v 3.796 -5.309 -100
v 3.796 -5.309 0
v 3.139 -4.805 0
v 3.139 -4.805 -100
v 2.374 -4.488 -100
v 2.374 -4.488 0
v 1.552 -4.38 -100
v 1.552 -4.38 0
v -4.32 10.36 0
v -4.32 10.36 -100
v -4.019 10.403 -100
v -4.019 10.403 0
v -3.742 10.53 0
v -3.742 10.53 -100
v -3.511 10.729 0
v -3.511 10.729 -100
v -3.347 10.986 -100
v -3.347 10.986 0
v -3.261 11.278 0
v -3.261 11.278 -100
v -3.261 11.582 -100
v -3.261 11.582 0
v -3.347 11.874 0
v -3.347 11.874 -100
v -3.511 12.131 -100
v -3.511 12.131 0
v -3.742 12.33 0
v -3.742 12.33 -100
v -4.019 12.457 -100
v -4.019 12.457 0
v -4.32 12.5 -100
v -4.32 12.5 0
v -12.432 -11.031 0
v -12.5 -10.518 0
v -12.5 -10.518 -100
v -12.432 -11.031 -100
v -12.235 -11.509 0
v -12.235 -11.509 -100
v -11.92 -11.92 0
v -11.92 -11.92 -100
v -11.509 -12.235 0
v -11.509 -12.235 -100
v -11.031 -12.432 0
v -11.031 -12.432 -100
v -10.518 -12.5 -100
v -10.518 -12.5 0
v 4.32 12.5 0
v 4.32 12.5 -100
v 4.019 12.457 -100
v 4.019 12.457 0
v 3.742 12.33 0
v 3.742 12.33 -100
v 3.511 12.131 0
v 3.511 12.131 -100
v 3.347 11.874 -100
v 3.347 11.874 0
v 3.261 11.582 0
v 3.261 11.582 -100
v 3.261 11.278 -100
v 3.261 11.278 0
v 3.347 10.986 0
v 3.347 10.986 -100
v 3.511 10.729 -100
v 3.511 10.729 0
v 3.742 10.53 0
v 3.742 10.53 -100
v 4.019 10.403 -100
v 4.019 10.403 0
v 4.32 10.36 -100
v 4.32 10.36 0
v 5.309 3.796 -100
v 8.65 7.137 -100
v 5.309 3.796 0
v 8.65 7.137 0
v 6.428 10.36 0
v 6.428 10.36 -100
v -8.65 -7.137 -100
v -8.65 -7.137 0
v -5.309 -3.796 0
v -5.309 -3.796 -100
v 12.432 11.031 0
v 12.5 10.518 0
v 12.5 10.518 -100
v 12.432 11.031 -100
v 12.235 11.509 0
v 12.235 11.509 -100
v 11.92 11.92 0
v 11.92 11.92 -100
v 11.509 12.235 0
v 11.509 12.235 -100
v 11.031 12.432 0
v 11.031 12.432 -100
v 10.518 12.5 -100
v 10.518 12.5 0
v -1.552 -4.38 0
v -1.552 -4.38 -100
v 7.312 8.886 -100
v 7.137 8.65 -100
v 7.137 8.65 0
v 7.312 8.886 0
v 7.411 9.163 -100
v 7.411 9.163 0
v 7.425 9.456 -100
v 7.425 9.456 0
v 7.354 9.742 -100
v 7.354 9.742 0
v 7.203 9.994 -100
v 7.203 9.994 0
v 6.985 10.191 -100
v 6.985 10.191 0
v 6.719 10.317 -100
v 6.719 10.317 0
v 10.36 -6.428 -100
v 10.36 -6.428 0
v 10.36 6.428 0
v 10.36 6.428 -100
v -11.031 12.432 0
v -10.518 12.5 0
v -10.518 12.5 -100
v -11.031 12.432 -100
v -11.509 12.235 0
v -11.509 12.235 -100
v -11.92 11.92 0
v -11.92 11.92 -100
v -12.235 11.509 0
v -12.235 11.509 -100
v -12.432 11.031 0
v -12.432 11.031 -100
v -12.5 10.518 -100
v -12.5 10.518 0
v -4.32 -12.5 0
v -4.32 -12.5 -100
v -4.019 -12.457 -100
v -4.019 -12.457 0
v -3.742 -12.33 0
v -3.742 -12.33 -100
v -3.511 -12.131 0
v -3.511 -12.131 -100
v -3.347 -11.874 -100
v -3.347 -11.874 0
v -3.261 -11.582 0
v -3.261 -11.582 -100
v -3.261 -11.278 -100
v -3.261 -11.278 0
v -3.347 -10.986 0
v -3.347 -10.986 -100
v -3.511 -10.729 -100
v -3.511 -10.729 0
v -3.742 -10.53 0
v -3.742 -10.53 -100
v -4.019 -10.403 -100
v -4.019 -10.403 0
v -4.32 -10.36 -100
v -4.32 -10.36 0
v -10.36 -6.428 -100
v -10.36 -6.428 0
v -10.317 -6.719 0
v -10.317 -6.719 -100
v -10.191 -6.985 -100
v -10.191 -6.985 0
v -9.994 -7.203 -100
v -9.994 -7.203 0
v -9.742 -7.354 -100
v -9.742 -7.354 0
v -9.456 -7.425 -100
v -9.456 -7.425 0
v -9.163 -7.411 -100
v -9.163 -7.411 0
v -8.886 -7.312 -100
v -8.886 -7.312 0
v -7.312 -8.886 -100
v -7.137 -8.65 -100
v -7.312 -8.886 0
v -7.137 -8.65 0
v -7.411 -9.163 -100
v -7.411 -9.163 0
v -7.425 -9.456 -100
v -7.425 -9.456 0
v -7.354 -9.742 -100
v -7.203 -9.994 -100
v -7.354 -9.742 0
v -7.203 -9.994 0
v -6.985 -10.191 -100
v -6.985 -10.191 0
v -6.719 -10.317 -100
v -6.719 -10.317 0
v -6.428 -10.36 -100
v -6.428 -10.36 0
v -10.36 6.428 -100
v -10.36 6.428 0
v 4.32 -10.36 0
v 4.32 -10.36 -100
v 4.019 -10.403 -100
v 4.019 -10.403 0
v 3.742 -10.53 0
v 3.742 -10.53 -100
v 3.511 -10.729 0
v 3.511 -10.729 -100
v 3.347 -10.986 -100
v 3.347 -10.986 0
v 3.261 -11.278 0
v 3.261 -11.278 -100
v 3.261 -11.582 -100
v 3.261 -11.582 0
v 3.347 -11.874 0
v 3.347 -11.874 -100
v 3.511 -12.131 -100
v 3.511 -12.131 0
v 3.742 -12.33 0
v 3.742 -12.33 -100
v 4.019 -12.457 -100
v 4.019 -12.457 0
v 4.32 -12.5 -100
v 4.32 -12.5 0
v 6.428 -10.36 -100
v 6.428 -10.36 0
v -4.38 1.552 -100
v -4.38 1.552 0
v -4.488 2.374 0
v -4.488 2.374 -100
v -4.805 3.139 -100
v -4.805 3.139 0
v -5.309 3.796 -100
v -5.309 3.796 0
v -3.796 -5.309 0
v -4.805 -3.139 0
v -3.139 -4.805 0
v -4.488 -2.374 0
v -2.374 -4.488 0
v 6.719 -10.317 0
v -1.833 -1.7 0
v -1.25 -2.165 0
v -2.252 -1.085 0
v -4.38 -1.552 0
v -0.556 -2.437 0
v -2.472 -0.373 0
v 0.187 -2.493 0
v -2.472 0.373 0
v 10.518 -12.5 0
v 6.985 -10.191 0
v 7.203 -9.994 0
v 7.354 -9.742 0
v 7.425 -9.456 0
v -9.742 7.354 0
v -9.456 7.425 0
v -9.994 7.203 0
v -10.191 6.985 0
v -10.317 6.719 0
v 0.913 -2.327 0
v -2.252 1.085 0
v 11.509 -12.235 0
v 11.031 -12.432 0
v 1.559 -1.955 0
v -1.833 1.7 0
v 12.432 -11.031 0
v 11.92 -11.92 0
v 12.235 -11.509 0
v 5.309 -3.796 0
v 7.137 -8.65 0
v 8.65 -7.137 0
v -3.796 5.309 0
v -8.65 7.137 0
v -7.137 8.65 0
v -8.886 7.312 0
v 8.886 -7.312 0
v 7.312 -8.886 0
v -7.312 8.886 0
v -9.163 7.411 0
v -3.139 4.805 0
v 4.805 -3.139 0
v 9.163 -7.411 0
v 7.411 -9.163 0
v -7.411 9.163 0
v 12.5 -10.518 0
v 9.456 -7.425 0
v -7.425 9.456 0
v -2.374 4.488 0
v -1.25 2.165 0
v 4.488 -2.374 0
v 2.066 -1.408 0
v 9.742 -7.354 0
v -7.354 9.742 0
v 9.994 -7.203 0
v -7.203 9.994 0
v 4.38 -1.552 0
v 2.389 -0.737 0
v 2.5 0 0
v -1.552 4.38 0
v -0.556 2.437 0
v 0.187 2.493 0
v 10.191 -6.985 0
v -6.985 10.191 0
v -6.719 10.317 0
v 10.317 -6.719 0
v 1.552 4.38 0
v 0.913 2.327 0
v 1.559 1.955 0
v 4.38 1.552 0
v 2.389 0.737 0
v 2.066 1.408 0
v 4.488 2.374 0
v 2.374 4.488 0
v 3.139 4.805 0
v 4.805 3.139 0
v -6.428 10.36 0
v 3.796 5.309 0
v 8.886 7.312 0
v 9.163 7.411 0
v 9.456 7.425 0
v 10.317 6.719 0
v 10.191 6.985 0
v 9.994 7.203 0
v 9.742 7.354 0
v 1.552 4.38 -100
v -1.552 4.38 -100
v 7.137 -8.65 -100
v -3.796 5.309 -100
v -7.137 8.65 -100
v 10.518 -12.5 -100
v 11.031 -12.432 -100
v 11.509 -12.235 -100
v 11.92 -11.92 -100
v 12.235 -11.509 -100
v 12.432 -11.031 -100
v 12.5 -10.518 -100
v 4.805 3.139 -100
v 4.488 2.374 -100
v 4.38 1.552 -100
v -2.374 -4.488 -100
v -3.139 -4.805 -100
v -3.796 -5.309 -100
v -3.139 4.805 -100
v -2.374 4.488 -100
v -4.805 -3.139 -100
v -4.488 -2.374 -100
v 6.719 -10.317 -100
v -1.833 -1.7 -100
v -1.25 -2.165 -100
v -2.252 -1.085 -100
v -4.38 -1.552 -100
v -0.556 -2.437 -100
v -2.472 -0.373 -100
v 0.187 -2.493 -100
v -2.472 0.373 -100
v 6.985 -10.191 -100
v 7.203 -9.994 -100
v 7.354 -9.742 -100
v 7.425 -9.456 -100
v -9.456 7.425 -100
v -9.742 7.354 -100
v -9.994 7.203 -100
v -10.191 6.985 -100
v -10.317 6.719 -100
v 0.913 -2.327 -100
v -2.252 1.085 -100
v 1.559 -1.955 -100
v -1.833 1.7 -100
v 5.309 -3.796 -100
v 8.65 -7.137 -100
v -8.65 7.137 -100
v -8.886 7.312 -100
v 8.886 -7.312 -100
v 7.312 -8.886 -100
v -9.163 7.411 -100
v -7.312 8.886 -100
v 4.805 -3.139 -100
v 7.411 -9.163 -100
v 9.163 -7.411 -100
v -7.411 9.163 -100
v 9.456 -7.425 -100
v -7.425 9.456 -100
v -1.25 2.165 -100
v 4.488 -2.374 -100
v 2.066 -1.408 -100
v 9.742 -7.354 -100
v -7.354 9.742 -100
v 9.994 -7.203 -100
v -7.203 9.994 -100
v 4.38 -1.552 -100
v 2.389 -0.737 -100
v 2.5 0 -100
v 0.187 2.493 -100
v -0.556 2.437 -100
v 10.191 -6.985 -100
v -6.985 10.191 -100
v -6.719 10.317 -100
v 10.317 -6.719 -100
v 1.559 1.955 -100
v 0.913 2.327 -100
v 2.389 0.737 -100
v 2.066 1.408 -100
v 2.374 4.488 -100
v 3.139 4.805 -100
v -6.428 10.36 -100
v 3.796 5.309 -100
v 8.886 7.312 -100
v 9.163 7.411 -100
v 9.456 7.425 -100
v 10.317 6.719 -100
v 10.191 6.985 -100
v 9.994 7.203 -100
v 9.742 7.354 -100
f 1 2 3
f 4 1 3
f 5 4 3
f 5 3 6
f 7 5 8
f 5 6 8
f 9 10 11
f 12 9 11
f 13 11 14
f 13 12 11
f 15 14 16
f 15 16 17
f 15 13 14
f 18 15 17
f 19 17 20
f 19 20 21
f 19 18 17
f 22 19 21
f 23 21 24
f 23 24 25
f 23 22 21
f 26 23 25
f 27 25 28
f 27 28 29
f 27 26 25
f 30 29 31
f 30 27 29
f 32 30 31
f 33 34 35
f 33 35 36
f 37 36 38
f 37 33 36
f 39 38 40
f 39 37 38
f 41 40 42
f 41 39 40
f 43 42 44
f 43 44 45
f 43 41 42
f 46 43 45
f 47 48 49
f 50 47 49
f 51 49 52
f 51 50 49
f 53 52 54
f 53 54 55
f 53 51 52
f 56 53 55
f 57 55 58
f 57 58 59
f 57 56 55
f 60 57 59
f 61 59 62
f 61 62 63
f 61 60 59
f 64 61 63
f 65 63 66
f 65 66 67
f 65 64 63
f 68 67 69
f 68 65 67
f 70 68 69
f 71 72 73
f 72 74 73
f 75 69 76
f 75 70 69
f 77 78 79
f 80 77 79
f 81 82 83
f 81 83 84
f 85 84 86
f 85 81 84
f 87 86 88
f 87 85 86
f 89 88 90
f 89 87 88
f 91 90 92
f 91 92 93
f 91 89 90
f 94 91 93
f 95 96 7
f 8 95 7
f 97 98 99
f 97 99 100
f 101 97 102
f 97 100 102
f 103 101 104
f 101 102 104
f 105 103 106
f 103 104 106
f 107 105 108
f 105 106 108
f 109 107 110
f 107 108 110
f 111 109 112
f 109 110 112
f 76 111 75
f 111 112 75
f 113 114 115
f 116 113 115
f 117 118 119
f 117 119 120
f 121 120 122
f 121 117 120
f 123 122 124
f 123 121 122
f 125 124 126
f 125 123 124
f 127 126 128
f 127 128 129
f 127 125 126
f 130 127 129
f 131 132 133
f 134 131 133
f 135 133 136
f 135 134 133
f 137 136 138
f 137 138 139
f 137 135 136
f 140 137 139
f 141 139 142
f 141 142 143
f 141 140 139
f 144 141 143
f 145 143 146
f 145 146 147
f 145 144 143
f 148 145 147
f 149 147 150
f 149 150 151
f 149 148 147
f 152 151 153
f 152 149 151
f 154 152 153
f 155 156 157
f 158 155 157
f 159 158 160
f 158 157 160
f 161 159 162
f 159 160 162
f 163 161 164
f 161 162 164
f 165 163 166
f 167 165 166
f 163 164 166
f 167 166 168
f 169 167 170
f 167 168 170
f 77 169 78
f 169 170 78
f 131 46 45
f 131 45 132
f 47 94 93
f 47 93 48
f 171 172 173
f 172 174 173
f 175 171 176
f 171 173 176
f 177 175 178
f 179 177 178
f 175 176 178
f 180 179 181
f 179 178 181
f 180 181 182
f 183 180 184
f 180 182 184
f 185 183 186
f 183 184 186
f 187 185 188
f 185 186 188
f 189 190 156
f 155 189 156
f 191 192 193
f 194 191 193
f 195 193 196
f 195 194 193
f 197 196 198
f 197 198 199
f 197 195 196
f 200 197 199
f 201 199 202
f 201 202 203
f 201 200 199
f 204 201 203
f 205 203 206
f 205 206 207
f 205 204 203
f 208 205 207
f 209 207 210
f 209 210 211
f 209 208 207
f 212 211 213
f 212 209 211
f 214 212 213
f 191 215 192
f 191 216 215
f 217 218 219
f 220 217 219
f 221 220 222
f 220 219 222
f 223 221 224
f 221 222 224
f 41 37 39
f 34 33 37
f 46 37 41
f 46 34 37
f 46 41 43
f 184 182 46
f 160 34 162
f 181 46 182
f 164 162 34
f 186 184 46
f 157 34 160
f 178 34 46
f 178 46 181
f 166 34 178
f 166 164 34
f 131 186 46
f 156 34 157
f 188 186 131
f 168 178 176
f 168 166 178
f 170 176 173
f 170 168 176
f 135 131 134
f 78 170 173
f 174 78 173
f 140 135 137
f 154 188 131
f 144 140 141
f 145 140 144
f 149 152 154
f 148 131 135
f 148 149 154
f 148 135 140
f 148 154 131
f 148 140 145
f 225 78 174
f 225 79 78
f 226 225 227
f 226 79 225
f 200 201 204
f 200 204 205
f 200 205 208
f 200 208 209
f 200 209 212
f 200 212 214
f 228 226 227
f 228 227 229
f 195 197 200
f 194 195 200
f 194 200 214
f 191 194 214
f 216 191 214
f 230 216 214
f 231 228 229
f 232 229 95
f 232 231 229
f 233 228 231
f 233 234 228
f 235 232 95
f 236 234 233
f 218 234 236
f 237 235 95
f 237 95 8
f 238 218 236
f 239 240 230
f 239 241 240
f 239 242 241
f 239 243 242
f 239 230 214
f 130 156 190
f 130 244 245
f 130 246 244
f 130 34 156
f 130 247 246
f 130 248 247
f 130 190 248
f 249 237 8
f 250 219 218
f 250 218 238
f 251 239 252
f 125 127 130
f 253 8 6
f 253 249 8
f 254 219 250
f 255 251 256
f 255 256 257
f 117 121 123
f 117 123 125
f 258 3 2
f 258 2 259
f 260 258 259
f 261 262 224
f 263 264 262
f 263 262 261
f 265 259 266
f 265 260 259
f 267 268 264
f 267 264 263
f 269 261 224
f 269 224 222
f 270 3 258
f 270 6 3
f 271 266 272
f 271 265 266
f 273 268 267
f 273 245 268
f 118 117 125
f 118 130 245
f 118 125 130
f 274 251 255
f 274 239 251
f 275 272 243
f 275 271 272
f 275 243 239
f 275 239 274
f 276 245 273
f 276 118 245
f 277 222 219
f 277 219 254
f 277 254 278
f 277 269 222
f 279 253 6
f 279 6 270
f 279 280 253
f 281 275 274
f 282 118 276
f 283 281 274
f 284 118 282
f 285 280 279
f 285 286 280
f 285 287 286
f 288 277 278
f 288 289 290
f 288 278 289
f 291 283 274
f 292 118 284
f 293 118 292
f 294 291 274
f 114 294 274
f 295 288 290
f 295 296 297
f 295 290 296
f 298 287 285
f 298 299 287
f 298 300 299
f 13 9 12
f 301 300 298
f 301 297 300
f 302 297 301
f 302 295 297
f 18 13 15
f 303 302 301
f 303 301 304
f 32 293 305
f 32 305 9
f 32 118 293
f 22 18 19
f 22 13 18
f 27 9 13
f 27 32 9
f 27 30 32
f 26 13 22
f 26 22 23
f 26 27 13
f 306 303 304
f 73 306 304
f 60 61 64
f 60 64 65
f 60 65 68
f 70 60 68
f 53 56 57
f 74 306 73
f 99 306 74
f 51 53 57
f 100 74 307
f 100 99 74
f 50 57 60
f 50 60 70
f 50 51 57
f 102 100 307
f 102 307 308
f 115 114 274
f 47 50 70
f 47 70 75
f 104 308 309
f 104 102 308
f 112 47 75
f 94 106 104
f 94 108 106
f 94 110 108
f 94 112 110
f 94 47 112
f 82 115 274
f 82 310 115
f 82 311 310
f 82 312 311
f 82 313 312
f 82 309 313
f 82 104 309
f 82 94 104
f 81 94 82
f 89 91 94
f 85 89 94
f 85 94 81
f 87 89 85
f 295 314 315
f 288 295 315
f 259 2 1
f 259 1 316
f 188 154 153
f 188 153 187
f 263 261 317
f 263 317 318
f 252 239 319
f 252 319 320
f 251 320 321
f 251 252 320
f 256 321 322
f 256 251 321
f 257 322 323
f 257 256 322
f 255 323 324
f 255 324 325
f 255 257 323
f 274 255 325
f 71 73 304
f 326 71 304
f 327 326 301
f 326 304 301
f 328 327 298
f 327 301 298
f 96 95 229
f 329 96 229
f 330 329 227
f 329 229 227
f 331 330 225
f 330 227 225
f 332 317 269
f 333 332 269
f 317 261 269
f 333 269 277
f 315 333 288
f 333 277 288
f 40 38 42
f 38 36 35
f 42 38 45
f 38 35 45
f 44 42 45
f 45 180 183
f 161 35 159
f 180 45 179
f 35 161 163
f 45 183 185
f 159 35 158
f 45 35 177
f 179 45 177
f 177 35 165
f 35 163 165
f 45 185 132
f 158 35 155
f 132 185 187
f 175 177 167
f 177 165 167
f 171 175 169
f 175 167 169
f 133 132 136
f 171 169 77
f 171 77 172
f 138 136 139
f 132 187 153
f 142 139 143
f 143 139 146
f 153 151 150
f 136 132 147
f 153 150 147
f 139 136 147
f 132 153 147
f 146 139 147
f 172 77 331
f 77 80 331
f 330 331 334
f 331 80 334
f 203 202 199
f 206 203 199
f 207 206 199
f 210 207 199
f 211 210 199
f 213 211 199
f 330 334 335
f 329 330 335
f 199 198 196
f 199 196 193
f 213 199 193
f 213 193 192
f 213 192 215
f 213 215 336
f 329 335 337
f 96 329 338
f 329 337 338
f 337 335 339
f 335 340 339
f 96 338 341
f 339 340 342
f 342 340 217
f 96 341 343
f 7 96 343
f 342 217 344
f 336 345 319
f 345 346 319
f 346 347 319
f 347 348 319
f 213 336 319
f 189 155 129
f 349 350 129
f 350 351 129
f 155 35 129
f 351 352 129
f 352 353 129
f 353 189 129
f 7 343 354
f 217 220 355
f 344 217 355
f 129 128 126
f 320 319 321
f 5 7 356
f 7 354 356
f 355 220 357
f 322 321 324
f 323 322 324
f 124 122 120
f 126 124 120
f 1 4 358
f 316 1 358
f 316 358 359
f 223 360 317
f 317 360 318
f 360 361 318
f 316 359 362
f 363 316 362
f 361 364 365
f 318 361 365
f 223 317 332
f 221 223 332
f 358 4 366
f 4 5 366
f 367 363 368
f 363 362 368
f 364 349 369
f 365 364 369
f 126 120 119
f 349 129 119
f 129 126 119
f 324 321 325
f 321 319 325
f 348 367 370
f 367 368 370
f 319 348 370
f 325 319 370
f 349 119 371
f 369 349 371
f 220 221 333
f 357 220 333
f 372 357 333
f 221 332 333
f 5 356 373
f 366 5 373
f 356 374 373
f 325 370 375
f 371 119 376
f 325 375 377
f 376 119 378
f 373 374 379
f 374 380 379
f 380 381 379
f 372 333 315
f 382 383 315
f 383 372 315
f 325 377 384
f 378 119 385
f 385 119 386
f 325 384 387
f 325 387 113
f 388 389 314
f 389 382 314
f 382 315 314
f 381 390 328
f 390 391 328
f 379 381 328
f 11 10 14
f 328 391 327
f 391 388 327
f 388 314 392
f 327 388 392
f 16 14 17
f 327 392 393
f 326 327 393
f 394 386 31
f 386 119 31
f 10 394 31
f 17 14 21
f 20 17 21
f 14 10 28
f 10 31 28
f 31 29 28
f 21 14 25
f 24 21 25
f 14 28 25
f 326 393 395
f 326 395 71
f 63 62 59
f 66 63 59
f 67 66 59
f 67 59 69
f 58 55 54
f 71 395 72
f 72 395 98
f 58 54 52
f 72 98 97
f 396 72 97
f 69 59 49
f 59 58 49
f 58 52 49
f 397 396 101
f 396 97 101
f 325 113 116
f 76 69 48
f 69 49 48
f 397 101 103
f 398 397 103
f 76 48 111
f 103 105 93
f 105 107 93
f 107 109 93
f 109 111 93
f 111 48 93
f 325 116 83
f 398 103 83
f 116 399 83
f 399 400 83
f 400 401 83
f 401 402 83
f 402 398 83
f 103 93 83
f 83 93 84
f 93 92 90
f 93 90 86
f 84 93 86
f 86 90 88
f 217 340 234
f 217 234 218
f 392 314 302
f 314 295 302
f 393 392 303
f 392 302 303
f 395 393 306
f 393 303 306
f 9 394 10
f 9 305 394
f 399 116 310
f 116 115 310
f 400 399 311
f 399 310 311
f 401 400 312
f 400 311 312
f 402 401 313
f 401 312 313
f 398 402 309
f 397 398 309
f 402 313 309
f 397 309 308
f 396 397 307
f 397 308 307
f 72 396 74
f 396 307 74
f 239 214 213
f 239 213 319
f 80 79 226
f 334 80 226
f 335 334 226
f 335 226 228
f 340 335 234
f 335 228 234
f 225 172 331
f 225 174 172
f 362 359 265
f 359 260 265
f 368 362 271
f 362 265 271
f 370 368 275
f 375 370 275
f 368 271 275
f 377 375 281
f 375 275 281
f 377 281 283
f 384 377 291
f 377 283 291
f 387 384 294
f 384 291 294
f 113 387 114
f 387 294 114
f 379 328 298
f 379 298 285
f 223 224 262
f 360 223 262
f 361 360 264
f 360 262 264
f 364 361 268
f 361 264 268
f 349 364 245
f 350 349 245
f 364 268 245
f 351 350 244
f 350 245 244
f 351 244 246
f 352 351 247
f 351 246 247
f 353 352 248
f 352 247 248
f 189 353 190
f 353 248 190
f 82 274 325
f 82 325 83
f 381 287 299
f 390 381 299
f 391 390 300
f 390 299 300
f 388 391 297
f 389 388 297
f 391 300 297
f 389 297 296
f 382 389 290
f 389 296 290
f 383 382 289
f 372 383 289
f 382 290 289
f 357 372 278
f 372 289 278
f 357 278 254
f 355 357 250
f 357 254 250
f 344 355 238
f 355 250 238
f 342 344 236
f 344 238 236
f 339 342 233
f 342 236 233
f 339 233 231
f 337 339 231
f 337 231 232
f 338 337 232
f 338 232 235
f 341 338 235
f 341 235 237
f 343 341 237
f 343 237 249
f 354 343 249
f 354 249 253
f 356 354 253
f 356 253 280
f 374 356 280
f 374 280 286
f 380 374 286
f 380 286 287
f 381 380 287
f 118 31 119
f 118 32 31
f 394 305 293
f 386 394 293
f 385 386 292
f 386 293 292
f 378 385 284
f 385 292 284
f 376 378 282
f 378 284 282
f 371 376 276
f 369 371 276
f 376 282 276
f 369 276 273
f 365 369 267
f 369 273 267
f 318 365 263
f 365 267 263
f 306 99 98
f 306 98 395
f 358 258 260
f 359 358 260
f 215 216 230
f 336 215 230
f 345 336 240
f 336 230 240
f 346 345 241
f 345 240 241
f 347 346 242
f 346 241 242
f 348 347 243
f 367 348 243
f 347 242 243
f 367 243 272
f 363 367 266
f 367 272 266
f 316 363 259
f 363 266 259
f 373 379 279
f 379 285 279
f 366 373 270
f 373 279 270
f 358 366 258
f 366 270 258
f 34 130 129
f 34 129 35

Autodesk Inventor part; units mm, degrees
ref_plane "YZ Plane" through (0, 0, 0) normal (1, 0, 0) x (0, 1, 0)
ref_plane "XZ Plane" through (0, 0, 0) normal (0, 1, 0) x (-1, 0, 0)
ref_plane "XY Plane" through (0, 0, 0) normal (0, 0, 1) x (1, 0, 0)
sketch "Sketch1" plane through (0, 0, 0) normal (0, 0, 1) x (1, 0, 0)
  arc A0 (-10.36, -6.4282) -> (-8.6498, -7.1366) centre (-9.3582, -6.4282) ccw
  line L0 (-10.36, 6.4282) -> (-10.36, -6.4282)
  arc A1 (-8.6498, 7.1366) -> (-10.36, 6.4282) centre (-9.3582, 6.4282) ccw
  line L1 (-5.3093, 3.7961) -> (-8.6498, 7.1366)
  arc A2 (-4.38, 1.5525) -> (-5.3093, 3.7961) centre (-7.553, 1.5525) ccw
  line L2 (-4.38, -1.5525) -> (-4.38, 1.5525)
  arc A3 (-5.3093, -3.7961) -> (-4.38, -1.5525) centre (-7.553, -1.5525) ccw
  line L3 (-8.6498, -7.1366) -> (-5.3093, -3.7961)
  arc A4 (8.6498, -7.1366) -> (10.36, -6.4282) centre (9.3582, -6.4282) ccw
  line L4 (5.3093, -3.7961) -> (8.6498, -7.1366)
  arc A5 (4.38, -1.5525) -> (5.3093, -3.7961) centre (7.553, -1.5525) ccw
  line L5 (4.38, 1.5525) -> (4.38, -1.5525)
  arc A6 (5.3093, 3.7961) -> (4.38, 1.5525) centre (7.553, 1.5525) ccw
  line L6 (8.6498, 7.1366) -> (5.3093, 3.7961)
  arc A7 (10.36, 6.4282) -> (8.6498, 7.1366) centre (9.3582, 6.4282) ccw
  line L7 (10.36, -6.4282) -> (10.36, 6.4282)
  circle A8 centre (0, 0) radius 2.5
  line L8 (-10.5183, -12.5) -> (-4.32, -12.5)
  arc A9 (-4.32, -12.5) -> (-4.32, -10.36) centre (-4.32, -11.43) ccw
  line L9 (-4.32, -10.36) -> (-6.4282, -10.36)
  arc A10 (-7.1366, -8.6498) -> (-6.4282, -10.36) centre (-6.4282, -9.3582) ccw
  line L10 (-7.1366, -8.6498) -> (-3.7961, -5.3093)
  arc A11 (-1.5525, -4.38) -> (-3.7961, -5.3093) centre (-1.5525, -7.553) ccw
  line L11 (-1.5525, -4.38) -> (1.5525, -4.38)
  arc A12 (3.7961, -5.3093) -> (1.5525, -4.38) centre (1.5525, -7.553) ccw
  line L12 (3.7961, -5.3093) -> (7.1366, -8.6498)
  arc A13 (6.4282, -10.36) -> (7.1366, -8.6498) centre (6.4282, -9.3582) ccw
  line L13 (6.4282, -10.36) -> (4.32, -10.36)
  arc A14 (4.32, -10.36) -> (4.32, -12.5) centre (4.32, -11.43) ccw
  line L14 (4.32, -12.5) -> (10.5183, -12.5)
  arc A15 (10.5183, -12.5) -> (12.5, -10.5183) centre (10.5183, -10.5183) ccw
  line L15 (12.5, -10.5183) -> (12.5, 10.5183)
  arc A16 (12.5, 10.5183) -> (10.5183, 12.5) centre (10.5183, 10.5183) ccw
  line L16 (10.5183, 12.5) -> (4.32, 12.5)
  arc A17 (4.32, 12.5) -> (4.32, 10.36) centre (4.32, 11.43) ccw
  line L17 (4.32, 10.36) -> (6.4282, 10.36)
  arc A18 (7.1366, 8.6498) -> (6.4282, 10.36) centre (6.4282, 9.3582) ccw
  line L18 (7.1366, 8.6498) -> (3.7961, 5.3093)
  arc A19 (1.5525, 4.38) -> (3.7961, 5.3093) centre (1.5525, 7.553) ccw
  line L19 (1.5525, 4.38) -> (-1.5525, 4.38)
  arc A20 (-3.7961, 5.3093) -> (-1.5525, 4.38) centre (-1.5525, 7.553) ccw
  line L20 (-3.7961, 5.3093) -> (-7.1366, 8.6498)
  arc A21 (-6.4282, 10.36) -> (-7.1366, 8.6498) centre (-6.4282, 9.3582) ccw
  line L21 (-6.4282, 10.36) -> (-4.32, 10.36)
  arc A22 (-4.32, 10.36) -> (-4.32, 12.5) centre (-4.32, 11.43) ccw
  line L22 (-4.32, 12.5) -> (-10.5183, 12.5)
  arc A23 (-10.5183, 12.5) -> (-12.5, 10.5183) centre (-10.5183, 10.5183) ccw
  line L23 (-12.5, 10.5183) -> (-12.5, -10.5183)
  arc A24 (-12.5, -10.5183) -> (-10.5183, -12.5) centre (-10.5183, -10.5183) ccw
extrude "Extrusion1" add sketch "Sketch1" against normal blind 100
properties part number "25-2504"
